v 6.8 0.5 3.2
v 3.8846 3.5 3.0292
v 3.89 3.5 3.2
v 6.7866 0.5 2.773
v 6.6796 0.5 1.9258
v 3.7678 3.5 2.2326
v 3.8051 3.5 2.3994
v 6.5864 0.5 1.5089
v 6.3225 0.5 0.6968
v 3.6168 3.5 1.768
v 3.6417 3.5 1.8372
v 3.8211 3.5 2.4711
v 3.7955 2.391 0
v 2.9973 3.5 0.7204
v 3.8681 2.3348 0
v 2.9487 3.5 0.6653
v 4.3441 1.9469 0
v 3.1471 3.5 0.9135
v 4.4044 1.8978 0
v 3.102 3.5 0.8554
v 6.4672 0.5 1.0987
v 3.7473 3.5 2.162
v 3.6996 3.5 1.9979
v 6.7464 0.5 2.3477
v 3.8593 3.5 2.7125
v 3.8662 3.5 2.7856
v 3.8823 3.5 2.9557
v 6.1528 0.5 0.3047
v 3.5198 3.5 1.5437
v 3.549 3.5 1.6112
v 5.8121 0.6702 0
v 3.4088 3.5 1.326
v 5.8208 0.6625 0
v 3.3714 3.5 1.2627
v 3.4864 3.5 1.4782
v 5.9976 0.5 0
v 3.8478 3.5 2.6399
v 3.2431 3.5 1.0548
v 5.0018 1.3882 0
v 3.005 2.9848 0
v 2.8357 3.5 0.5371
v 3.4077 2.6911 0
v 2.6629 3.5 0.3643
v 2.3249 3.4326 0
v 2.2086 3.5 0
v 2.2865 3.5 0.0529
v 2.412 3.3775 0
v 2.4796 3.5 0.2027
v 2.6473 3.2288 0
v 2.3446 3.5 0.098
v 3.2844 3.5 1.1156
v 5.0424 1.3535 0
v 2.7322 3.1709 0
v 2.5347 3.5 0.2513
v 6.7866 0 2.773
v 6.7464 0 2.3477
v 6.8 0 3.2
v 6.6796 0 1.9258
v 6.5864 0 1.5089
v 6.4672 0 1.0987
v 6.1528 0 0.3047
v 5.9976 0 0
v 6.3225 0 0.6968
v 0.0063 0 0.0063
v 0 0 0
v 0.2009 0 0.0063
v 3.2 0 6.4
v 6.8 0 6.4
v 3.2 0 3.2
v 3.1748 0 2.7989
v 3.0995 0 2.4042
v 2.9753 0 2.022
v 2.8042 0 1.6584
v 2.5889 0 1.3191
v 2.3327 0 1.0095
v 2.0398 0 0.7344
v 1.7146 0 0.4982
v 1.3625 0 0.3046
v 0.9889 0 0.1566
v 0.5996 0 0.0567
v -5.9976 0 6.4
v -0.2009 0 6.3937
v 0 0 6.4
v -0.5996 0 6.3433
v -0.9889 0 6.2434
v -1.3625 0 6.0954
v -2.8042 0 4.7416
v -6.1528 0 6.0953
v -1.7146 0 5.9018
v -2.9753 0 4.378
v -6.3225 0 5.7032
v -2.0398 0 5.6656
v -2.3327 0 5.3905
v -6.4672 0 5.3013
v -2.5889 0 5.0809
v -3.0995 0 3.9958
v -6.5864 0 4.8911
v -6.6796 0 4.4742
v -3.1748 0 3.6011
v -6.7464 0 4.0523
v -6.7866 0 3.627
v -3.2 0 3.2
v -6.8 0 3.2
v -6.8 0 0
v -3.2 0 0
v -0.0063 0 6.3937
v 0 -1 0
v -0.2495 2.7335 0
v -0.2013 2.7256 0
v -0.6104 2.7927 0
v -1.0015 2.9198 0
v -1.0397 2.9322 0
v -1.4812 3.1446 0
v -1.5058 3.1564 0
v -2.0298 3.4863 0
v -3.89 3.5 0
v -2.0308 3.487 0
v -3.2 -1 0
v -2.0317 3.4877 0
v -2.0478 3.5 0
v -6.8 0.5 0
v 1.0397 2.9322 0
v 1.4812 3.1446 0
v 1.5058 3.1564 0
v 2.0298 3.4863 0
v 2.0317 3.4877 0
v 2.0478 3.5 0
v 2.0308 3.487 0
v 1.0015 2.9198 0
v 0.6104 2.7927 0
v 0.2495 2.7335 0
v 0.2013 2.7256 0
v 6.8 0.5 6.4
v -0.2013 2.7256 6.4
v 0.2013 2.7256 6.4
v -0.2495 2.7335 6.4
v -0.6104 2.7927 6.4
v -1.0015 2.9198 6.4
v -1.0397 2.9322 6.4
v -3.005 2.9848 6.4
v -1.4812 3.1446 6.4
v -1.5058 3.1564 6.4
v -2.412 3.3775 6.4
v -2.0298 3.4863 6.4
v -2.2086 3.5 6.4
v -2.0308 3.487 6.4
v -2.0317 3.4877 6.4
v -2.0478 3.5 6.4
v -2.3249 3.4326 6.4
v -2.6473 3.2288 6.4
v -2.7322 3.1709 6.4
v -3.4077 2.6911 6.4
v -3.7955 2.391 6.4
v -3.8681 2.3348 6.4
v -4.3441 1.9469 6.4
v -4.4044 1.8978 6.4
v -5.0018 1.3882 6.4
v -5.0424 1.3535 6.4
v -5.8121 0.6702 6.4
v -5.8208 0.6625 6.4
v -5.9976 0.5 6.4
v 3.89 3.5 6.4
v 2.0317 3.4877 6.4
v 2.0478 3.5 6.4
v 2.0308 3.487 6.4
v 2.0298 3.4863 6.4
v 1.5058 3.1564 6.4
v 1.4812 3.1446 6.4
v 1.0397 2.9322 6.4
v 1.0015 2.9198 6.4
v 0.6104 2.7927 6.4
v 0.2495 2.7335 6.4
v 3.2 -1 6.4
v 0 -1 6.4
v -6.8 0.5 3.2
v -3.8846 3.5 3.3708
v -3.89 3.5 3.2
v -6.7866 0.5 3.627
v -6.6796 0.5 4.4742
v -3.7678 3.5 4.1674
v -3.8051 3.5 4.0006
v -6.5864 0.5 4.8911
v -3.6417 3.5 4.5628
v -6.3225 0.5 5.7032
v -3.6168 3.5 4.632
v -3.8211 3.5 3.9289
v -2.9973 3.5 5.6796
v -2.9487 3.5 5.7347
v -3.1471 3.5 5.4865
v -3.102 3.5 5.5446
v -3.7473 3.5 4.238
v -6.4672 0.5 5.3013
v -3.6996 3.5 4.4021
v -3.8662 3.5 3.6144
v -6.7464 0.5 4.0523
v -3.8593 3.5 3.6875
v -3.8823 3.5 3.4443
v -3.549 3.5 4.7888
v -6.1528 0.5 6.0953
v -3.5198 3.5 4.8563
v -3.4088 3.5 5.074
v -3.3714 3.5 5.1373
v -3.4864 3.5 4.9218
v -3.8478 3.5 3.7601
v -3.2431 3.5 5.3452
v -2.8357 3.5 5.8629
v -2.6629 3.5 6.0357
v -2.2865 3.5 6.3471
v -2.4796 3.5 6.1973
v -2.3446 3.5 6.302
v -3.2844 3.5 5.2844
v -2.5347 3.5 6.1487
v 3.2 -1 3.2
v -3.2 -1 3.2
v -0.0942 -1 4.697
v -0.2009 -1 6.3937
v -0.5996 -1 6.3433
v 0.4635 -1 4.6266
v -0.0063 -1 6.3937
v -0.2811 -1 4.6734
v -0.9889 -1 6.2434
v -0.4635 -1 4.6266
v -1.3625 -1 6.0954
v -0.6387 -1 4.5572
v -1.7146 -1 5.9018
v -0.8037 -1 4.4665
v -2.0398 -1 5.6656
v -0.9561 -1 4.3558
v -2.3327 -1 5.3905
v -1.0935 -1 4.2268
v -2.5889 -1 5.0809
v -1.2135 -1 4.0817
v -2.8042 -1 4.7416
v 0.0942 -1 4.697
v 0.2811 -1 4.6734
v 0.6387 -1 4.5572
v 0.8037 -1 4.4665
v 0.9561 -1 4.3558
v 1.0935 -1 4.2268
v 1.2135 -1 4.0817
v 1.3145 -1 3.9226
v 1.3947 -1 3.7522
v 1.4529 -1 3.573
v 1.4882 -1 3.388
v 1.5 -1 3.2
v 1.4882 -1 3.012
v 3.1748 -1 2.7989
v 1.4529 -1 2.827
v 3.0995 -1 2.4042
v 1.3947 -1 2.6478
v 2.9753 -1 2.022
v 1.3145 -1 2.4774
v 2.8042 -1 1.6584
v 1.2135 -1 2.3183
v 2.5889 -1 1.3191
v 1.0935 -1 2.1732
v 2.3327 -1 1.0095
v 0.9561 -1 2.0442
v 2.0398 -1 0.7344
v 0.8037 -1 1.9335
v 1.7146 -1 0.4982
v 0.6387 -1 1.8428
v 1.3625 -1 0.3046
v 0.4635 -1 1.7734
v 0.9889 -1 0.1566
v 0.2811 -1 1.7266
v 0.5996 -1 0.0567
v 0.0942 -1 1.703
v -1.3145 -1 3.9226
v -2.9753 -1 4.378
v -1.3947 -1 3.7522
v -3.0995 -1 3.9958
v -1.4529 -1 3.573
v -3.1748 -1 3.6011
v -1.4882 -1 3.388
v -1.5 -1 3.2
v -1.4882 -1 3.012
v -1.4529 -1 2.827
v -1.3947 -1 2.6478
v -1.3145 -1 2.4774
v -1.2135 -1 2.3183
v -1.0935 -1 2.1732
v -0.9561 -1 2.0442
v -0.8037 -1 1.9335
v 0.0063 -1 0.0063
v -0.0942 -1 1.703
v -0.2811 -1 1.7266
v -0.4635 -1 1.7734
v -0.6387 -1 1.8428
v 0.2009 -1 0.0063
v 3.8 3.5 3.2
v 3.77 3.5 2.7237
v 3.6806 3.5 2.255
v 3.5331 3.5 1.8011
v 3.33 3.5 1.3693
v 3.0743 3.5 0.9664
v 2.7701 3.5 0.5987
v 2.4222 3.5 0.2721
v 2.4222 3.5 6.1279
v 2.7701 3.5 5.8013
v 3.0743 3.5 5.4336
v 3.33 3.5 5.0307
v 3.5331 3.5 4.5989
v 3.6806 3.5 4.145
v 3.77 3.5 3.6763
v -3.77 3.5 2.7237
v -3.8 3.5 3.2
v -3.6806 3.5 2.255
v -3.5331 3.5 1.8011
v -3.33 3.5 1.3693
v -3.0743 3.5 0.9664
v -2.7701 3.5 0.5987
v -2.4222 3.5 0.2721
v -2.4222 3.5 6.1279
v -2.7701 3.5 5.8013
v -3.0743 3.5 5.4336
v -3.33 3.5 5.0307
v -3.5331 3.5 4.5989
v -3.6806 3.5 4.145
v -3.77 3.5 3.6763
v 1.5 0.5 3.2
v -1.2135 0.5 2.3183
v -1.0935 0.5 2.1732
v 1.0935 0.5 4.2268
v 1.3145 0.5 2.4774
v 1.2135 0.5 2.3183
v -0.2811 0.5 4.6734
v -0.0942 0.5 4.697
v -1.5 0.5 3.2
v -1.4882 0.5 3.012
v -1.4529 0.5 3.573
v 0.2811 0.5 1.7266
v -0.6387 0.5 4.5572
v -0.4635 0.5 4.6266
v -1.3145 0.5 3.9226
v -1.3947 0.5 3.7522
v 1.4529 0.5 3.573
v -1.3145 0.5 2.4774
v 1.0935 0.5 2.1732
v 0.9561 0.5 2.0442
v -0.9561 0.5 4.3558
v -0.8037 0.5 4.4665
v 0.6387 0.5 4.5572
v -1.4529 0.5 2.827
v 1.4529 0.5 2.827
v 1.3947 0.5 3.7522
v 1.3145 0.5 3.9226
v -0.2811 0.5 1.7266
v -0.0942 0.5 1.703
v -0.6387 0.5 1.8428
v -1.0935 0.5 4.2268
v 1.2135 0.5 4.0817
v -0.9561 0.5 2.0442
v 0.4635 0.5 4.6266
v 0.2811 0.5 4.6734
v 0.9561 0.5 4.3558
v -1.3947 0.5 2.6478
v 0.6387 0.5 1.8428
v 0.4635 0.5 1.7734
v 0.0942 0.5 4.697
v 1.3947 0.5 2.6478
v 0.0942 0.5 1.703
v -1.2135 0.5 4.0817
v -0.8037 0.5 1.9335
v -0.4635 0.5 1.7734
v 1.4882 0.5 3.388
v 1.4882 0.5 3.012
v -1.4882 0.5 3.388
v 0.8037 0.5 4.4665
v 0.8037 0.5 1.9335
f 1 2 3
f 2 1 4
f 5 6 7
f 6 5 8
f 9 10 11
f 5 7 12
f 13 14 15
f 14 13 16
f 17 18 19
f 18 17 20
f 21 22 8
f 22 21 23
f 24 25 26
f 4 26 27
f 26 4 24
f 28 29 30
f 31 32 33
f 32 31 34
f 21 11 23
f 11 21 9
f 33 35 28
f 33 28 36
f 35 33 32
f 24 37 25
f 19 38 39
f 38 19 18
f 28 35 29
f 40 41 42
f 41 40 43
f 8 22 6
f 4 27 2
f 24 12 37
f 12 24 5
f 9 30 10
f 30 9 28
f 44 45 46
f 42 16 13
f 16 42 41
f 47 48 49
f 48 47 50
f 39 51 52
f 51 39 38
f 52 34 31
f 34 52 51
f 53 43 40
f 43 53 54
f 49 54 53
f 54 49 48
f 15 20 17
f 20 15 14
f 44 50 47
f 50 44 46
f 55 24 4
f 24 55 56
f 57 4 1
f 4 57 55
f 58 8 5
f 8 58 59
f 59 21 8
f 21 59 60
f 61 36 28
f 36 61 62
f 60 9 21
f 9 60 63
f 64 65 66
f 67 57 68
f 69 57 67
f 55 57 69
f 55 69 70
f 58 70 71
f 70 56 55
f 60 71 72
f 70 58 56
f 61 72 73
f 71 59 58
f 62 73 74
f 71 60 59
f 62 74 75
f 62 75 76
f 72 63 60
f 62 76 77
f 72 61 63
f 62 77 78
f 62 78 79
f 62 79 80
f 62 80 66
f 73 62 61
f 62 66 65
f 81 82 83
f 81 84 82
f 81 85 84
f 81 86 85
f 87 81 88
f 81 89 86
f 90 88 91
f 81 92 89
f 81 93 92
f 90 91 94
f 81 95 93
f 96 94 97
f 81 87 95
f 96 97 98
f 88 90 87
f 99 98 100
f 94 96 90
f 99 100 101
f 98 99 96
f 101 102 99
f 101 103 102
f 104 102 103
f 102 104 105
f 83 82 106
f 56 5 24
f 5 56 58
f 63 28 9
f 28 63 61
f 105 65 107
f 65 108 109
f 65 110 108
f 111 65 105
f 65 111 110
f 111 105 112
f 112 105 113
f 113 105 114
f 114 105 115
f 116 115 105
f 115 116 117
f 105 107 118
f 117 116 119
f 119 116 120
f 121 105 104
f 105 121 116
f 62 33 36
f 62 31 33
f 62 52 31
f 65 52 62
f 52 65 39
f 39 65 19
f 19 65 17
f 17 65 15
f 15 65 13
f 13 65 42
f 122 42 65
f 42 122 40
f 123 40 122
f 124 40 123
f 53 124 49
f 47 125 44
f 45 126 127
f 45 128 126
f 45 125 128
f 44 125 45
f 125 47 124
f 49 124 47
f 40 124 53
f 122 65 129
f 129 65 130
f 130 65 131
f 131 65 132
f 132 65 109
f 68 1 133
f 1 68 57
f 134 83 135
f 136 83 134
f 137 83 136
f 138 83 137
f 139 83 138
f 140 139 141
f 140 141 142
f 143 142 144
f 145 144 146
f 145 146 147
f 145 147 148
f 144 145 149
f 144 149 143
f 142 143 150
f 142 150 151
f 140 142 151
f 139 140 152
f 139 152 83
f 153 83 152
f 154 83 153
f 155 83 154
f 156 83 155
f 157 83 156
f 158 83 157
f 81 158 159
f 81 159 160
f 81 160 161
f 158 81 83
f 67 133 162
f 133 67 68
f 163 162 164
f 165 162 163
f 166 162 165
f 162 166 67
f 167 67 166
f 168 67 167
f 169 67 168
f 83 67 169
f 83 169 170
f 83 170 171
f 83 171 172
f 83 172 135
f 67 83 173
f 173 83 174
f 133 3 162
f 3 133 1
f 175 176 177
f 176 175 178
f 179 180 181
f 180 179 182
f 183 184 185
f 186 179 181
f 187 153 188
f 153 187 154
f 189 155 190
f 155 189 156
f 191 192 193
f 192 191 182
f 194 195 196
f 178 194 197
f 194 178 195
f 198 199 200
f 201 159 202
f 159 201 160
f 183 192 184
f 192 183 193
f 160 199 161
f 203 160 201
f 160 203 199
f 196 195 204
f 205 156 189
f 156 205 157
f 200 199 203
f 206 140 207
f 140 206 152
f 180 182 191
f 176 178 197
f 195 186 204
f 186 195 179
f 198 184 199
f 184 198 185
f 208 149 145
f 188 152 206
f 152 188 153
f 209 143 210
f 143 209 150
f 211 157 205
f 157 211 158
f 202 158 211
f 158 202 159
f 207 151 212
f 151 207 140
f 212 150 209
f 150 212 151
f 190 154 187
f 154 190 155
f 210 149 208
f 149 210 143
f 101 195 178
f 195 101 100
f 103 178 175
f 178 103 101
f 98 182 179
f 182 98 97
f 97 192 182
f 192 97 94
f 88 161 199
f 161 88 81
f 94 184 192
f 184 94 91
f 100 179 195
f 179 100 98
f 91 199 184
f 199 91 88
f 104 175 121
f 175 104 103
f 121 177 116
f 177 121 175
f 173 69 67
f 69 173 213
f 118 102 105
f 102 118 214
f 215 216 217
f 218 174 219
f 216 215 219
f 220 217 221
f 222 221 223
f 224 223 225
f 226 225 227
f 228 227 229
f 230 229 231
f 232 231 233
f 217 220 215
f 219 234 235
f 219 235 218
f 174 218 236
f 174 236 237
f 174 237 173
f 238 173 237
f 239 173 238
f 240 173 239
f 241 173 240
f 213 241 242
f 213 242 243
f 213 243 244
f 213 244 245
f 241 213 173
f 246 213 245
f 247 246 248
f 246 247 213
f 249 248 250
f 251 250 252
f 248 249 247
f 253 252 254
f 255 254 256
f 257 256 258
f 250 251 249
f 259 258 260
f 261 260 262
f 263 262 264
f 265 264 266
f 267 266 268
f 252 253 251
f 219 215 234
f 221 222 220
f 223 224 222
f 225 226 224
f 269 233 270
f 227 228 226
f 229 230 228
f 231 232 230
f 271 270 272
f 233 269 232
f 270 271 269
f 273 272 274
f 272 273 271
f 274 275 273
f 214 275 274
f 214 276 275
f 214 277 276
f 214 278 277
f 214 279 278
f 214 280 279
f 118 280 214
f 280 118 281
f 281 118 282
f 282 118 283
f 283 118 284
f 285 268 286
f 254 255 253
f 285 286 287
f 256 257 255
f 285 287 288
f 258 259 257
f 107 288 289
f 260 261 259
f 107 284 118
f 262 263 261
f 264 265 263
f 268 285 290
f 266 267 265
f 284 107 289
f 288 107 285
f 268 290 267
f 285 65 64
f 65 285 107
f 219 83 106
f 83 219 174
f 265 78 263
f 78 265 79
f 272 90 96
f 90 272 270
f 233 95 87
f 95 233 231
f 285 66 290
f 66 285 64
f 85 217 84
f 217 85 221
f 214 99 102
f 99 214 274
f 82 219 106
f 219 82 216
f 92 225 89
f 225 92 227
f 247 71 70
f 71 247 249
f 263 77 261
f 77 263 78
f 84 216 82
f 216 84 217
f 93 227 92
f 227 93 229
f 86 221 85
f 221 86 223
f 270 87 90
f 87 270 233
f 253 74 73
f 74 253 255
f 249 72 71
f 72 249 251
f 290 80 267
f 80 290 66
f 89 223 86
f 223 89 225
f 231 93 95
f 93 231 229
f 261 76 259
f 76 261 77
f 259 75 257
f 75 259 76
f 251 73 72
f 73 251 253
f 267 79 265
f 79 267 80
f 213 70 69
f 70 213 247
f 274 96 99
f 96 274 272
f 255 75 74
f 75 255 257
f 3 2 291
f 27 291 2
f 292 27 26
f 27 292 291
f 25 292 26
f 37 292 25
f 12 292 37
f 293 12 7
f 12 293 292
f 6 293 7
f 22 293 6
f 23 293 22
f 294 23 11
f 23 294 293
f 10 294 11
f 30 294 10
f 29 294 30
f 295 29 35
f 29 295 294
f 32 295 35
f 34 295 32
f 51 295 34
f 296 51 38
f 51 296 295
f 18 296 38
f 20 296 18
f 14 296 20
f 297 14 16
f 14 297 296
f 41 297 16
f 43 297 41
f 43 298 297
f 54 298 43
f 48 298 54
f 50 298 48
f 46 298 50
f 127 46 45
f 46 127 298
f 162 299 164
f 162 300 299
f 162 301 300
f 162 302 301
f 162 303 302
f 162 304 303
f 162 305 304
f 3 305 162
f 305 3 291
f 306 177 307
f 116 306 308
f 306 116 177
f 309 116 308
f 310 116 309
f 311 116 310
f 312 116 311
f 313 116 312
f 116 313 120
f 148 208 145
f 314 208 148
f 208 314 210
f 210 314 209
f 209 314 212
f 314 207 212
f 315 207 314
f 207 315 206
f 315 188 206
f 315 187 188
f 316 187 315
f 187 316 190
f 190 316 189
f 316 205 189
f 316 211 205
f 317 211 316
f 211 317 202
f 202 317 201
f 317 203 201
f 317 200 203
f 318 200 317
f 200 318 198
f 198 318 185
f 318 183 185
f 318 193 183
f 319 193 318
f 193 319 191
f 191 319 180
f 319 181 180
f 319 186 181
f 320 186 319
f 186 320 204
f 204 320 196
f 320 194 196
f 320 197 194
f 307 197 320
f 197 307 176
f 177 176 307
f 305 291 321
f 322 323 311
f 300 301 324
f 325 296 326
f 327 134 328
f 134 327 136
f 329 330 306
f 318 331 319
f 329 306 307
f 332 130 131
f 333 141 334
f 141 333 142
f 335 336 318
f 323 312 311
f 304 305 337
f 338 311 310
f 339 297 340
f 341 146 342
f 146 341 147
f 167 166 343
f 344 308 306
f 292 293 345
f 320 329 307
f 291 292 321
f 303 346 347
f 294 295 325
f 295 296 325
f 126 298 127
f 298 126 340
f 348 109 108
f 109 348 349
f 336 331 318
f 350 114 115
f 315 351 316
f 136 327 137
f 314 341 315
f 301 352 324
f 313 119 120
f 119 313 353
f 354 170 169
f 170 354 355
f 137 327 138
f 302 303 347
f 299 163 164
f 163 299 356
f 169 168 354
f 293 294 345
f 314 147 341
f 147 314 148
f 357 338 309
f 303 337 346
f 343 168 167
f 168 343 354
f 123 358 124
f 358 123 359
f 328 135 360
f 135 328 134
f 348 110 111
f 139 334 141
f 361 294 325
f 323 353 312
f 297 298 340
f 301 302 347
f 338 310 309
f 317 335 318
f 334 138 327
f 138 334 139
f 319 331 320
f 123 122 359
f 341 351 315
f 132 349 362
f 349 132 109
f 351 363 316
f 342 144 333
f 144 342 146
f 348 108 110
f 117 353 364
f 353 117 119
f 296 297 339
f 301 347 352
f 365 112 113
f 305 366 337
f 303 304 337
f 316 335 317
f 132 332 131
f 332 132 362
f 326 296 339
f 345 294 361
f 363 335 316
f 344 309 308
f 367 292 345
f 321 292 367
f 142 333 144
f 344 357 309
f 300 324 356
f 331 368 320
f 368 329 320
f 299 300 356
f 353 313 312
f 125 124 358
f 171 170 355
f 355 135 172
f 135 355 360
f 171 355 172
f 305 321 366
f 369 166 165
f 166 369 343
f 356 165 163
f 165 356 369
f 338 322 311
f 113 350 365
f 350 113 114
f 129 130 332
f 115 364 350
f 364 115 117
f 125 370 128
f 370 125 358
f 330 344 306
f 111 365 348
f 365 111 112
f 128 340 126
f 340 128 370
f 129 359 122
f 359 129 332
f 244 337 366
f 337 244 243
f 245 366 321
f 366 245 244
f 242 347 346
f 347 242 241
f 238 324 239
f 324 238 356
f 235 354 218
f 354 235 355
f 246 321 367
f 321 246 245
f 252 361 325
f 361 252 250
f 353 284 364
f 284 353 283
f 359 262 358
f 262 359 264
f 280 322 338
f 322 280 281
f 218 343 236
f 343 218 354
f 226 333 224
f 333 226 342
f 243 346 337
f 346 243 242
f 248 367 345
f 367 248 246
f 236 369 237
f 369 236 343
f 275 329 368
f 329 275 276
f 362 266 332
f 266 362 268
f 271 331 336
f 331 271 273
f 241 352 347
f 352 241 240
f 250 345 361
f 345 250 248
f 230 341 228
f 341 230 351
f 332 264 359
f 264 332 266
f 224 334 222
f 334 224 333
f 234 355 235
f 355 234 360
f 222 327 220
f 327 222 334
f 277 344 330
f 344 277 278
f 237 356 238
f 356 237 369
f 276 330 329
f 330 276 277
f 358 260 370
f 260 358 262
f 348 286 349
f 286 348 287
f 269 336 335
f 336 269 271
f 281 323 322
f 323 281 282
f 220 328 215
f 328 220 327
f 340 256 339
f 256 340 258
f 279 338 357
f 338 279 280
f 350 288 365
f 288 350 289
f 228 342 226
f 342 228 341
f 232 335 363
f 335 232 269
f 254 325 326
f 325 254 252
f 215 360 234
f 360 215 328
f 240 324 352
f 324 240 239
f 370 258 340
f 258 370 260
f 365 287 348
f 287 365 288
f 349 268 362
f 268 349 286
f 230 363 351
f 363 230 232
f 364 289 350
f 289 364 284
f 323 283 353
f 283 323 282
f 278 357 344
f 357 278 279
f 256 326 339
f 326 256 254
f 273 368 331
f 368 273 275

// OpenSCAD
solt_d1=14.1-0.5;
solt_d2=4.4-0.5;
solt_depth=5.5;
solt_width=6.4;

t_nut();
//bolt();

module t_nut() {
    difference() {
        translate([0, 0, solt_width/2]) union() {
            main();
            convex();
        }
        translate([0, 3.5, solt_width/2]) rotate([90, 0, 0]) screw();
    }
    
    module main() {
        rotate([0, 180, 0]) half();
        half();
        
        /// 1/4
        module part() intersection() {
            rotate([-90, 0, 0]) union() {
                translate([0, 0, 0.5]) cylinder(d2=solt_d2, d1=solt_d1, h=solt_depth-0.5, $fn=100);
                cylinder(d=solt_d1, h=0.5, $fn=100);
            }
            translate([0, 0, -solt_width/2]) cube([solt_d1/2, solt_depth, solt_width/2]);
        }

        /// 1/2
        module half() {
            linear_extrude(height=solt_width/2) projection() part();
            part();
        }
    }
    
    module convex() {
        rotate([90, 0, 0]) cylinder(d=solt_width, h=1, $fn=50);
        intersection() {
            translate([-solt_width/2, -1, -solt_width/2]) cube([solt_width, 1, solt_width]);
            rotate([0, 45, 0]) cube([sin(45)*solt_width, 99, 99], center=true);
        }
    }

    module screw() {
        $fn=50;
        translate([0, 0, -10]) cylinder(d=100, h=10);
        cylinder(d1=7.6, d2=3, h=3);
        cylinder(d=3, h=10);
    }
}

module bolt() difference() {
    $fn=20;
    cylinder(d=9, h=8, $fn=6);
    cylinder(d=3, h=7);
}
